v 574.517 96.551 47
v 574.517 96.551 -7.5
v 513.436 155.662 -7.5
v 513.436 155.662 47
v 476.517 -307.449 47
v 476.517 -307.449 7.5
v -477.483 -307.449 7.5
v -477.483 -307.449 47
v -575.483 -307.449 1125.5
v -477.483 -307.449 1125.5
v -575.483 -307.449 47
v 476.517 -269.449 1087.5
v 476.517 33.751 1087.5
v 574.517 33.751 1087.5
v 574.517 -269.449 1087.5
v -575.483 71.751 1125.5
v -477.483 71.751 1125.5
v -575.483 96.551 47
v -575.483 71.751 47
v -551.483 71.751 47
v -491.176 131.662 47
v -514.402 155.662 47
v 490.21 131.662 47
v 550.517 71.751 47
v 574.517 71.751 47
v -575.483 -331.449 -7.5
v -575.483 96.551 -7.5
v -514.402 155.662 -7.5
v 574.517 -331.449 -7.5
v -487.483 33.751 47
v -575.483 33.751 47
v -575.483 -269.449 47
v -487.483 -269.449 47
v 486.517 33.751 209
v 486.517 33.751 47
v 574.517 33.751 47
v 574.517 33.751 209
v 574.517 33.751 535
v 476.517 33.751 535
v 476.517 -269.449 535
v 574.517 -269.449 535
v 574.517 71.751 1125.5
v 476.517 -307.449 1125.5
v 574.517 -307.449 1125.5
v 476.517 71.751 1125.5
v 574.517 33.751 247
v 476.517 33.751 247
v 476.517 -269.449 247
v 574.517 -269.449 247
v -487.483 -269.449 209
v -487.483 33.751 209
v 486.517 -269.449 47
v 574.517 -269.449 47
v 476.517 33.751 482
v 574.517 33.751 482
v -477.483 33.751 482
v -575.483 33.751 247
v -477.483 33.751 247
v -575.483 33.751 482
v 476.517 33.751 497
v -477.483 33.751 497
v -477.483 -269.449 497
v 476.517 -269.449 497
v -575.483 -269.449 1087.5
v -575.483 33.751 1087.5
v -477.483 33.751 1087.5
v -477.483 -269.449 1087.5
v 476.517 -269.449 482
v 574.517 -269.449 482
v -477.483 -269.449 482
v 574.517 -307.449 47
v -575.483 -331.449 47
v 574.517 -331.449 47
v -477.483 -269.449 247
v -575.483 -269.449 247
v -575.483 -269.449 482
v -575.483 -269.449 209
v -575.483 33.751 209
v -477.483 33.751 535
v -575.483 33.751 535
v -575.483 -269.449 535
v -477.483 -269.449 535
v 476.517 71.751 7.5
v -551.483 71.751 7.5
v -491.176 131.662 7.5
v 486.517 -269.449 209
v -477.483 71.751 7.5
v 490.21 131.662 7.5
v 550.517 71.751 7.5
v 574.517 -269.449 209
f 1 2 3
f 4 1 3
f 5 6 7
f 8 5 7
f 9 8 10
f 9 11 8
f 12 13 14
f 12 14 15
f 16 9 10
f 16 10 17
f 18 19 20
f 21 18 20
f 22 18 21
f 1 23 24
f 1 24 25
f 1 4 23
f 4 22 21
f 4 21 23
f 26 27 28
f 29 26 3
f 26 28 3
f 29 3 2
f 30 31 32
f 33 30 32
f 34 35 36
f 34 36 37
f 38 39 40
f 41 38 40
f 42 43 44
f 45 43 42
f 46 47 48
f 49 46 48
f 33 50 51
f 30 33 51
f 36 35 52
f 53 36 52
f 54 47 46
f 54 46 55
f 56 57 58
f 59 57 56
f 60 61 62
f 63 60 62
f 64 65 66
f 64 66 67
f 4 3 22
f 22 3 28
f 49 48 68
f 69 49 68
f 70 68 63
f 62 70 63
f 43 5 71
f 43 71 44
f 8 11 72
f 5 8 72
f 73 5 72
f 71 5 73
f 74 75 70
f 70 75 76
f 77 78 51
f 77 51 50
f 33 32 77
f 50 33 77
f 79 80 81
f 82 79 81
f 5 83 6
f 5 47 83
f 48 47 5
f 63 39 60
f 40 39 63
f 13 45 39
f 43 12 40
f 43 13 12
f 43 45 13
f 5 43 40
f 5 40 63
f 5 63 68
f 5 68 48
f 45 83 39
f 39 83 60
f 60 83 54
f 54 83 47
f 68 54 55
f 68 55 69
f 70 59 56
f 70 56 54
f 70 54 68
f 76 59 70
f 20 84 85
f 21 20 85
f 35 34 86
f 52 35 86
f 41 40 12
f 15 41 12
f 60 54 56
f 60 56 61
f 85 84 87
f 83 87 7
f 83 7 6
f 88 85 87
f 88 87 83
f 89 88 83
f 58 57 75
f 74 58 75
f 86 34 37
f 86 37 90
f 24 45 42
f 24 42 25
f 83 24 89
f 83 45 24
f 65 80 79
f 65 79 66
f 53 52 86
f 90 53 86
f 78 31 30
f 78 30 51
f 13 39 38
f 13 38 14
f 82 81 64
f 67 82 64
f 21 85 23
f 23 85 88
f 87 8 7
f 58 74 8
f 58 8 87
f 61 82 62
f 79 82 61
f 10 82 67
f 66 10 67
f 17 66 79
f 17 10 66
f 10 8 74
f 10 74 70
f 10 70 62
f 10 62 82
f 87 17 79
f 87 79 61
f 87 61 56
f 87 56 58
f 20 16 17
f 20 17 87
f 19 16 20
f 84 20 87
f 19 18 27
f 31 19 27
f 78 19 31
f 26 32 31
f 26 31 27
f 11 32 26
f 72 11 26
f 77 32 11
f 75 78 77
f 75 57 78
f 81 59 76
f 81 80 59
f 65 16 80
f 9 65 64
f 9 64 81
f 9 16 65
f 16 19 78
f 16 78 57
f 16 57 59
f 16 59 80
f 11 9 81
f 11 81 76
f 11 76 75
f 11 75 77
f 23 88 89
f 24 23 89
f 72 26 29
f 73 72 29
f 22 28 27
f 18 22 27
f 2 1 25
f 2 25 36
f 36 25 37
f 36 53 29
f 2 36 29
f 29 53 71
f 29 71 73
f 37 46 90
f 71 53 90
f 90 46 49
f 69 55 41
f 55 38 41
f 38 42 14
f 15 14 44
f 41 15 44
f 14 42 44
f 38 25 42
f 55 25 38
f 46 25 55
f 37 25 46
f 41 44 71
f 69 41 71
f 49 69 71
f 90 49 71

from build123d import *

# Parameters (mm, degrees)
F1_DEPTH  = 7.5
F2_DEPTH  = 47
F3_W      = 98
F3_H      = 38
F3_H_2    = 303.1999886395
F4_DEPTH  = 1080
F5_W      = 303.1999886395
F5_H      = 552.5
F5_H_2    = 235
F6_DEPTH  = 1150.001
F7_DEPTH  = 1150
F8_W      = 954
F8_H      = 379.1999886395
F9_DEPTH  = 49
F5_H_3    = 162
F10_DEPTH = 1150
F11_W     = 303.1999886395
F11_H     = 162
F12_DEPTH = 10
F13_W     = 303.1999886395
F13_H     = 162
F14_DEPTH = 10
F5_H_4    = 15
F15_DEPTH = 1150


with BuildPart() as f1:
    # F0 (on Top) → F1 (new body, symmetric)
    with BuildSketch(Plane.XY):
        Polygon((550.5168708265, 71.7507553279), (574.5168708265, 96.5507666884), (513.4356752447, 155.6615740446), (490.2098794325, 131.6615740446), align=None)
        Polygon((513.4356752447, 155.6615740446), (-514.4019335917, 155.6615740446), (-491.1761377795, 131.6615740446), (490.2098794325, 131.6615740446), align=None)
        Polygon((-514.4019335917, 155.6615740446), (-575.4831291735, 96.5507666884), (-551.4831291735, 71.7507553279), (-491.1761377795, 131.6615740446), align=None)
        Polygon((-575.4831291735, 96.5507666884), (-575.4831291735, -331.4492333116), (-551.4831291735, -307.4492333116), (-551.4831291735, 71.7507553279), align=None)
        Polygon((550.5168708265, -307.4492333116), (574.5168708265, -331.4492333116), (574.5168708265, 96.5507666884), (550.5168708265, 71.7507553279), align=None)
        Polygon((-551.4831291735, -307.4492333116), (-575.4831291735, -331.4492333116), (574.5168708265, -331.4492333116), (550.5168708265, -307.4492333116), align=None)
        Polygon((-551.4831291735, 71.7507553279), (-551.4831291735, -307.4492333116), (550.5168708265, -307.4492333116), (550.5168708265, 71.7507553279), (490.2098794325, 131.6615740446), (-491.1761377795, 131.6615740446), align=None)
    extrude(amount=F1_DEPTH, both=True)

    # F0 (on Top) → F2 (join)
    with BuildSketch(Plane.XY):
        Polygon((-551.4831291735, -307.4492333116), (-575.4831291735, -331.4492333116), (574.5168708265, -331.4492333116), (550.5168708265, -307.4492333116), align=None)
        Polygon((-575.4831291735, 96.5507666884), (-575.4831291735, -331.4492333116), (-551.4831291735, -307.4492333116), (-551.4831291735, 71.7507553279), align=None)
        Polygon((550.5168708265, -307.4492333116), (574.5168708265, -331.4492333116), (574.5168708265, 96.5507666884), (550.5168708265, 71.7507553279), align=None)
        Polygon((-514.4019335917, 155.6615740446), (-575.4831291735, 96.5507666884), (-551.4831291735, 71.7507553279), (-491.1761377795, 131.6615740446), align=None)
        Polygon((550.5168708265, 71.7507553279), (574.5168708265, 96.5507666884), (513.4356752447, 155.6615740446), (490.2098794325, 131.6615740446), align=None)
        Polygon((513.4356752447, 155.6615740446), (-514.4019335917, 155.6615740446), (-491.1761377795, 131.6615740446), (490.2098794325, 131.6615740446), align=None)
    extrude(amount=F2_DEPTH)

    # F3 (on face) → F4 (join)
    with BuildSketch(Plane.XY.offset(7.5)):
        with Locations((-526.4831291735, -288.4492333116)):
            Rectangle(F3_W, F3_H)
        with Locations((-526.4831291735, -117.8492389919)):
            Rectangle(F3_W, F3_H_2)
        with Locations((-526.4831291735, 52.7507553279)):
            Rectangle(F3_W, F3_H)
        with Locations((525.5168708265, -288.4492333116)):
            Rectangle(F3_W, F3_H)
        with Locations((525.5168708265, -117.8492389919)):
            Rectangle(F3_W, F3_H_2)
        with Locations((525.5168708265, 52.7507553279)):
            Rectangle(F3_W, F3_H)
    extrude(amount=F4_DEPTH)

    # F5 (on face) → F6 (cut, through all)
    with BuildSketch(Plane(origin=(-575.4831291735, 0, 0), x_dir=(0, -1, 0), z_dir=(-1, 0, 0))):
        with Locations((117.8492389919, 811.25)):
            Rectangle(F5_W, F5_H)
        with Locations((117.8492389919, 364.5)):
            Rectangle(F5_W, F5_H_2)
    extrude(amount=-F6_DEPTH, mode=Mode.SUBTRACT)

    # F5 (on face) → F7 (join)
    with BuildSketch(Plane(origin=(-575.4831291735, 0, 0), x_dir=(0, -1, 0), z_dir=(-1, 0, 0))):
        Polygon((-71.7507553279, 1087.5), (-33.7507553279, 1087.5), (269.4492333116, 1087.5), (307.4492333116, 1087.5), (307.4492333116, 1125.5), (-71.7507553279, 1125.5), align=None)
    extrude(amount=-F7_DEPTH)

    # F8 (on face) → F9 (cut, symmetric)
    with BuildSketch(Plane.XY.offset(1125.5)):
        with Locations((-0.4831291735, -117.8492389919)):
            Rectangle(F8_W, F8_H)
    extrude(amount=F9_DEPTH, both=True, mode=Mode.SUBTRACT)

    # F5 (on face) → F10 (cut)
    with BuildSketch(Plane(origin=(-575.4831291735, 0, 0), x_dir=(0, -1, 0), z_dir=(-1, 0, 0))):
        with Locations((117.8492389919, 128)):
            Rectangle(F5_W, F5_H_3)
    extrude(amount=-F10_DEPTH, mode=Mode.SUBTRACT)

    # F11 (on face) → F12 (join)
    with BuildSketch(Plane.YZ.offset(-477.4831291735)):
        with Locations((-117.8492389919, 128)):
            Rectangle(F11_W, F11_H)
    extrude(amount=-F12_DEPTH)

    # F13 (on face) → F14 (join)
    with BuildSketch(Plane(origin=(476.5168708265, 0, 0), x_dir=(0, -1, 0), z_dir=(-1, 0, 0))):
        with Locations((117.8492389919, 128)):
            Rectangle(F13_W, F13_H)
    extrude(amount=-F14_DEPTH)

    # F5 (on face) → F15 (join)
    with BuildSketch(Plane(origin=(-575.4831291735, 0, 0), x_dir=(0, -1, 0), z_dir=(-1, 0, 0))):
        with Locations((117.8492389919, 489.5)):
            Rectangle(F5_W, F5_H_4)
    extrude(amount=-F15_DEPTH)


solid = f1.part
